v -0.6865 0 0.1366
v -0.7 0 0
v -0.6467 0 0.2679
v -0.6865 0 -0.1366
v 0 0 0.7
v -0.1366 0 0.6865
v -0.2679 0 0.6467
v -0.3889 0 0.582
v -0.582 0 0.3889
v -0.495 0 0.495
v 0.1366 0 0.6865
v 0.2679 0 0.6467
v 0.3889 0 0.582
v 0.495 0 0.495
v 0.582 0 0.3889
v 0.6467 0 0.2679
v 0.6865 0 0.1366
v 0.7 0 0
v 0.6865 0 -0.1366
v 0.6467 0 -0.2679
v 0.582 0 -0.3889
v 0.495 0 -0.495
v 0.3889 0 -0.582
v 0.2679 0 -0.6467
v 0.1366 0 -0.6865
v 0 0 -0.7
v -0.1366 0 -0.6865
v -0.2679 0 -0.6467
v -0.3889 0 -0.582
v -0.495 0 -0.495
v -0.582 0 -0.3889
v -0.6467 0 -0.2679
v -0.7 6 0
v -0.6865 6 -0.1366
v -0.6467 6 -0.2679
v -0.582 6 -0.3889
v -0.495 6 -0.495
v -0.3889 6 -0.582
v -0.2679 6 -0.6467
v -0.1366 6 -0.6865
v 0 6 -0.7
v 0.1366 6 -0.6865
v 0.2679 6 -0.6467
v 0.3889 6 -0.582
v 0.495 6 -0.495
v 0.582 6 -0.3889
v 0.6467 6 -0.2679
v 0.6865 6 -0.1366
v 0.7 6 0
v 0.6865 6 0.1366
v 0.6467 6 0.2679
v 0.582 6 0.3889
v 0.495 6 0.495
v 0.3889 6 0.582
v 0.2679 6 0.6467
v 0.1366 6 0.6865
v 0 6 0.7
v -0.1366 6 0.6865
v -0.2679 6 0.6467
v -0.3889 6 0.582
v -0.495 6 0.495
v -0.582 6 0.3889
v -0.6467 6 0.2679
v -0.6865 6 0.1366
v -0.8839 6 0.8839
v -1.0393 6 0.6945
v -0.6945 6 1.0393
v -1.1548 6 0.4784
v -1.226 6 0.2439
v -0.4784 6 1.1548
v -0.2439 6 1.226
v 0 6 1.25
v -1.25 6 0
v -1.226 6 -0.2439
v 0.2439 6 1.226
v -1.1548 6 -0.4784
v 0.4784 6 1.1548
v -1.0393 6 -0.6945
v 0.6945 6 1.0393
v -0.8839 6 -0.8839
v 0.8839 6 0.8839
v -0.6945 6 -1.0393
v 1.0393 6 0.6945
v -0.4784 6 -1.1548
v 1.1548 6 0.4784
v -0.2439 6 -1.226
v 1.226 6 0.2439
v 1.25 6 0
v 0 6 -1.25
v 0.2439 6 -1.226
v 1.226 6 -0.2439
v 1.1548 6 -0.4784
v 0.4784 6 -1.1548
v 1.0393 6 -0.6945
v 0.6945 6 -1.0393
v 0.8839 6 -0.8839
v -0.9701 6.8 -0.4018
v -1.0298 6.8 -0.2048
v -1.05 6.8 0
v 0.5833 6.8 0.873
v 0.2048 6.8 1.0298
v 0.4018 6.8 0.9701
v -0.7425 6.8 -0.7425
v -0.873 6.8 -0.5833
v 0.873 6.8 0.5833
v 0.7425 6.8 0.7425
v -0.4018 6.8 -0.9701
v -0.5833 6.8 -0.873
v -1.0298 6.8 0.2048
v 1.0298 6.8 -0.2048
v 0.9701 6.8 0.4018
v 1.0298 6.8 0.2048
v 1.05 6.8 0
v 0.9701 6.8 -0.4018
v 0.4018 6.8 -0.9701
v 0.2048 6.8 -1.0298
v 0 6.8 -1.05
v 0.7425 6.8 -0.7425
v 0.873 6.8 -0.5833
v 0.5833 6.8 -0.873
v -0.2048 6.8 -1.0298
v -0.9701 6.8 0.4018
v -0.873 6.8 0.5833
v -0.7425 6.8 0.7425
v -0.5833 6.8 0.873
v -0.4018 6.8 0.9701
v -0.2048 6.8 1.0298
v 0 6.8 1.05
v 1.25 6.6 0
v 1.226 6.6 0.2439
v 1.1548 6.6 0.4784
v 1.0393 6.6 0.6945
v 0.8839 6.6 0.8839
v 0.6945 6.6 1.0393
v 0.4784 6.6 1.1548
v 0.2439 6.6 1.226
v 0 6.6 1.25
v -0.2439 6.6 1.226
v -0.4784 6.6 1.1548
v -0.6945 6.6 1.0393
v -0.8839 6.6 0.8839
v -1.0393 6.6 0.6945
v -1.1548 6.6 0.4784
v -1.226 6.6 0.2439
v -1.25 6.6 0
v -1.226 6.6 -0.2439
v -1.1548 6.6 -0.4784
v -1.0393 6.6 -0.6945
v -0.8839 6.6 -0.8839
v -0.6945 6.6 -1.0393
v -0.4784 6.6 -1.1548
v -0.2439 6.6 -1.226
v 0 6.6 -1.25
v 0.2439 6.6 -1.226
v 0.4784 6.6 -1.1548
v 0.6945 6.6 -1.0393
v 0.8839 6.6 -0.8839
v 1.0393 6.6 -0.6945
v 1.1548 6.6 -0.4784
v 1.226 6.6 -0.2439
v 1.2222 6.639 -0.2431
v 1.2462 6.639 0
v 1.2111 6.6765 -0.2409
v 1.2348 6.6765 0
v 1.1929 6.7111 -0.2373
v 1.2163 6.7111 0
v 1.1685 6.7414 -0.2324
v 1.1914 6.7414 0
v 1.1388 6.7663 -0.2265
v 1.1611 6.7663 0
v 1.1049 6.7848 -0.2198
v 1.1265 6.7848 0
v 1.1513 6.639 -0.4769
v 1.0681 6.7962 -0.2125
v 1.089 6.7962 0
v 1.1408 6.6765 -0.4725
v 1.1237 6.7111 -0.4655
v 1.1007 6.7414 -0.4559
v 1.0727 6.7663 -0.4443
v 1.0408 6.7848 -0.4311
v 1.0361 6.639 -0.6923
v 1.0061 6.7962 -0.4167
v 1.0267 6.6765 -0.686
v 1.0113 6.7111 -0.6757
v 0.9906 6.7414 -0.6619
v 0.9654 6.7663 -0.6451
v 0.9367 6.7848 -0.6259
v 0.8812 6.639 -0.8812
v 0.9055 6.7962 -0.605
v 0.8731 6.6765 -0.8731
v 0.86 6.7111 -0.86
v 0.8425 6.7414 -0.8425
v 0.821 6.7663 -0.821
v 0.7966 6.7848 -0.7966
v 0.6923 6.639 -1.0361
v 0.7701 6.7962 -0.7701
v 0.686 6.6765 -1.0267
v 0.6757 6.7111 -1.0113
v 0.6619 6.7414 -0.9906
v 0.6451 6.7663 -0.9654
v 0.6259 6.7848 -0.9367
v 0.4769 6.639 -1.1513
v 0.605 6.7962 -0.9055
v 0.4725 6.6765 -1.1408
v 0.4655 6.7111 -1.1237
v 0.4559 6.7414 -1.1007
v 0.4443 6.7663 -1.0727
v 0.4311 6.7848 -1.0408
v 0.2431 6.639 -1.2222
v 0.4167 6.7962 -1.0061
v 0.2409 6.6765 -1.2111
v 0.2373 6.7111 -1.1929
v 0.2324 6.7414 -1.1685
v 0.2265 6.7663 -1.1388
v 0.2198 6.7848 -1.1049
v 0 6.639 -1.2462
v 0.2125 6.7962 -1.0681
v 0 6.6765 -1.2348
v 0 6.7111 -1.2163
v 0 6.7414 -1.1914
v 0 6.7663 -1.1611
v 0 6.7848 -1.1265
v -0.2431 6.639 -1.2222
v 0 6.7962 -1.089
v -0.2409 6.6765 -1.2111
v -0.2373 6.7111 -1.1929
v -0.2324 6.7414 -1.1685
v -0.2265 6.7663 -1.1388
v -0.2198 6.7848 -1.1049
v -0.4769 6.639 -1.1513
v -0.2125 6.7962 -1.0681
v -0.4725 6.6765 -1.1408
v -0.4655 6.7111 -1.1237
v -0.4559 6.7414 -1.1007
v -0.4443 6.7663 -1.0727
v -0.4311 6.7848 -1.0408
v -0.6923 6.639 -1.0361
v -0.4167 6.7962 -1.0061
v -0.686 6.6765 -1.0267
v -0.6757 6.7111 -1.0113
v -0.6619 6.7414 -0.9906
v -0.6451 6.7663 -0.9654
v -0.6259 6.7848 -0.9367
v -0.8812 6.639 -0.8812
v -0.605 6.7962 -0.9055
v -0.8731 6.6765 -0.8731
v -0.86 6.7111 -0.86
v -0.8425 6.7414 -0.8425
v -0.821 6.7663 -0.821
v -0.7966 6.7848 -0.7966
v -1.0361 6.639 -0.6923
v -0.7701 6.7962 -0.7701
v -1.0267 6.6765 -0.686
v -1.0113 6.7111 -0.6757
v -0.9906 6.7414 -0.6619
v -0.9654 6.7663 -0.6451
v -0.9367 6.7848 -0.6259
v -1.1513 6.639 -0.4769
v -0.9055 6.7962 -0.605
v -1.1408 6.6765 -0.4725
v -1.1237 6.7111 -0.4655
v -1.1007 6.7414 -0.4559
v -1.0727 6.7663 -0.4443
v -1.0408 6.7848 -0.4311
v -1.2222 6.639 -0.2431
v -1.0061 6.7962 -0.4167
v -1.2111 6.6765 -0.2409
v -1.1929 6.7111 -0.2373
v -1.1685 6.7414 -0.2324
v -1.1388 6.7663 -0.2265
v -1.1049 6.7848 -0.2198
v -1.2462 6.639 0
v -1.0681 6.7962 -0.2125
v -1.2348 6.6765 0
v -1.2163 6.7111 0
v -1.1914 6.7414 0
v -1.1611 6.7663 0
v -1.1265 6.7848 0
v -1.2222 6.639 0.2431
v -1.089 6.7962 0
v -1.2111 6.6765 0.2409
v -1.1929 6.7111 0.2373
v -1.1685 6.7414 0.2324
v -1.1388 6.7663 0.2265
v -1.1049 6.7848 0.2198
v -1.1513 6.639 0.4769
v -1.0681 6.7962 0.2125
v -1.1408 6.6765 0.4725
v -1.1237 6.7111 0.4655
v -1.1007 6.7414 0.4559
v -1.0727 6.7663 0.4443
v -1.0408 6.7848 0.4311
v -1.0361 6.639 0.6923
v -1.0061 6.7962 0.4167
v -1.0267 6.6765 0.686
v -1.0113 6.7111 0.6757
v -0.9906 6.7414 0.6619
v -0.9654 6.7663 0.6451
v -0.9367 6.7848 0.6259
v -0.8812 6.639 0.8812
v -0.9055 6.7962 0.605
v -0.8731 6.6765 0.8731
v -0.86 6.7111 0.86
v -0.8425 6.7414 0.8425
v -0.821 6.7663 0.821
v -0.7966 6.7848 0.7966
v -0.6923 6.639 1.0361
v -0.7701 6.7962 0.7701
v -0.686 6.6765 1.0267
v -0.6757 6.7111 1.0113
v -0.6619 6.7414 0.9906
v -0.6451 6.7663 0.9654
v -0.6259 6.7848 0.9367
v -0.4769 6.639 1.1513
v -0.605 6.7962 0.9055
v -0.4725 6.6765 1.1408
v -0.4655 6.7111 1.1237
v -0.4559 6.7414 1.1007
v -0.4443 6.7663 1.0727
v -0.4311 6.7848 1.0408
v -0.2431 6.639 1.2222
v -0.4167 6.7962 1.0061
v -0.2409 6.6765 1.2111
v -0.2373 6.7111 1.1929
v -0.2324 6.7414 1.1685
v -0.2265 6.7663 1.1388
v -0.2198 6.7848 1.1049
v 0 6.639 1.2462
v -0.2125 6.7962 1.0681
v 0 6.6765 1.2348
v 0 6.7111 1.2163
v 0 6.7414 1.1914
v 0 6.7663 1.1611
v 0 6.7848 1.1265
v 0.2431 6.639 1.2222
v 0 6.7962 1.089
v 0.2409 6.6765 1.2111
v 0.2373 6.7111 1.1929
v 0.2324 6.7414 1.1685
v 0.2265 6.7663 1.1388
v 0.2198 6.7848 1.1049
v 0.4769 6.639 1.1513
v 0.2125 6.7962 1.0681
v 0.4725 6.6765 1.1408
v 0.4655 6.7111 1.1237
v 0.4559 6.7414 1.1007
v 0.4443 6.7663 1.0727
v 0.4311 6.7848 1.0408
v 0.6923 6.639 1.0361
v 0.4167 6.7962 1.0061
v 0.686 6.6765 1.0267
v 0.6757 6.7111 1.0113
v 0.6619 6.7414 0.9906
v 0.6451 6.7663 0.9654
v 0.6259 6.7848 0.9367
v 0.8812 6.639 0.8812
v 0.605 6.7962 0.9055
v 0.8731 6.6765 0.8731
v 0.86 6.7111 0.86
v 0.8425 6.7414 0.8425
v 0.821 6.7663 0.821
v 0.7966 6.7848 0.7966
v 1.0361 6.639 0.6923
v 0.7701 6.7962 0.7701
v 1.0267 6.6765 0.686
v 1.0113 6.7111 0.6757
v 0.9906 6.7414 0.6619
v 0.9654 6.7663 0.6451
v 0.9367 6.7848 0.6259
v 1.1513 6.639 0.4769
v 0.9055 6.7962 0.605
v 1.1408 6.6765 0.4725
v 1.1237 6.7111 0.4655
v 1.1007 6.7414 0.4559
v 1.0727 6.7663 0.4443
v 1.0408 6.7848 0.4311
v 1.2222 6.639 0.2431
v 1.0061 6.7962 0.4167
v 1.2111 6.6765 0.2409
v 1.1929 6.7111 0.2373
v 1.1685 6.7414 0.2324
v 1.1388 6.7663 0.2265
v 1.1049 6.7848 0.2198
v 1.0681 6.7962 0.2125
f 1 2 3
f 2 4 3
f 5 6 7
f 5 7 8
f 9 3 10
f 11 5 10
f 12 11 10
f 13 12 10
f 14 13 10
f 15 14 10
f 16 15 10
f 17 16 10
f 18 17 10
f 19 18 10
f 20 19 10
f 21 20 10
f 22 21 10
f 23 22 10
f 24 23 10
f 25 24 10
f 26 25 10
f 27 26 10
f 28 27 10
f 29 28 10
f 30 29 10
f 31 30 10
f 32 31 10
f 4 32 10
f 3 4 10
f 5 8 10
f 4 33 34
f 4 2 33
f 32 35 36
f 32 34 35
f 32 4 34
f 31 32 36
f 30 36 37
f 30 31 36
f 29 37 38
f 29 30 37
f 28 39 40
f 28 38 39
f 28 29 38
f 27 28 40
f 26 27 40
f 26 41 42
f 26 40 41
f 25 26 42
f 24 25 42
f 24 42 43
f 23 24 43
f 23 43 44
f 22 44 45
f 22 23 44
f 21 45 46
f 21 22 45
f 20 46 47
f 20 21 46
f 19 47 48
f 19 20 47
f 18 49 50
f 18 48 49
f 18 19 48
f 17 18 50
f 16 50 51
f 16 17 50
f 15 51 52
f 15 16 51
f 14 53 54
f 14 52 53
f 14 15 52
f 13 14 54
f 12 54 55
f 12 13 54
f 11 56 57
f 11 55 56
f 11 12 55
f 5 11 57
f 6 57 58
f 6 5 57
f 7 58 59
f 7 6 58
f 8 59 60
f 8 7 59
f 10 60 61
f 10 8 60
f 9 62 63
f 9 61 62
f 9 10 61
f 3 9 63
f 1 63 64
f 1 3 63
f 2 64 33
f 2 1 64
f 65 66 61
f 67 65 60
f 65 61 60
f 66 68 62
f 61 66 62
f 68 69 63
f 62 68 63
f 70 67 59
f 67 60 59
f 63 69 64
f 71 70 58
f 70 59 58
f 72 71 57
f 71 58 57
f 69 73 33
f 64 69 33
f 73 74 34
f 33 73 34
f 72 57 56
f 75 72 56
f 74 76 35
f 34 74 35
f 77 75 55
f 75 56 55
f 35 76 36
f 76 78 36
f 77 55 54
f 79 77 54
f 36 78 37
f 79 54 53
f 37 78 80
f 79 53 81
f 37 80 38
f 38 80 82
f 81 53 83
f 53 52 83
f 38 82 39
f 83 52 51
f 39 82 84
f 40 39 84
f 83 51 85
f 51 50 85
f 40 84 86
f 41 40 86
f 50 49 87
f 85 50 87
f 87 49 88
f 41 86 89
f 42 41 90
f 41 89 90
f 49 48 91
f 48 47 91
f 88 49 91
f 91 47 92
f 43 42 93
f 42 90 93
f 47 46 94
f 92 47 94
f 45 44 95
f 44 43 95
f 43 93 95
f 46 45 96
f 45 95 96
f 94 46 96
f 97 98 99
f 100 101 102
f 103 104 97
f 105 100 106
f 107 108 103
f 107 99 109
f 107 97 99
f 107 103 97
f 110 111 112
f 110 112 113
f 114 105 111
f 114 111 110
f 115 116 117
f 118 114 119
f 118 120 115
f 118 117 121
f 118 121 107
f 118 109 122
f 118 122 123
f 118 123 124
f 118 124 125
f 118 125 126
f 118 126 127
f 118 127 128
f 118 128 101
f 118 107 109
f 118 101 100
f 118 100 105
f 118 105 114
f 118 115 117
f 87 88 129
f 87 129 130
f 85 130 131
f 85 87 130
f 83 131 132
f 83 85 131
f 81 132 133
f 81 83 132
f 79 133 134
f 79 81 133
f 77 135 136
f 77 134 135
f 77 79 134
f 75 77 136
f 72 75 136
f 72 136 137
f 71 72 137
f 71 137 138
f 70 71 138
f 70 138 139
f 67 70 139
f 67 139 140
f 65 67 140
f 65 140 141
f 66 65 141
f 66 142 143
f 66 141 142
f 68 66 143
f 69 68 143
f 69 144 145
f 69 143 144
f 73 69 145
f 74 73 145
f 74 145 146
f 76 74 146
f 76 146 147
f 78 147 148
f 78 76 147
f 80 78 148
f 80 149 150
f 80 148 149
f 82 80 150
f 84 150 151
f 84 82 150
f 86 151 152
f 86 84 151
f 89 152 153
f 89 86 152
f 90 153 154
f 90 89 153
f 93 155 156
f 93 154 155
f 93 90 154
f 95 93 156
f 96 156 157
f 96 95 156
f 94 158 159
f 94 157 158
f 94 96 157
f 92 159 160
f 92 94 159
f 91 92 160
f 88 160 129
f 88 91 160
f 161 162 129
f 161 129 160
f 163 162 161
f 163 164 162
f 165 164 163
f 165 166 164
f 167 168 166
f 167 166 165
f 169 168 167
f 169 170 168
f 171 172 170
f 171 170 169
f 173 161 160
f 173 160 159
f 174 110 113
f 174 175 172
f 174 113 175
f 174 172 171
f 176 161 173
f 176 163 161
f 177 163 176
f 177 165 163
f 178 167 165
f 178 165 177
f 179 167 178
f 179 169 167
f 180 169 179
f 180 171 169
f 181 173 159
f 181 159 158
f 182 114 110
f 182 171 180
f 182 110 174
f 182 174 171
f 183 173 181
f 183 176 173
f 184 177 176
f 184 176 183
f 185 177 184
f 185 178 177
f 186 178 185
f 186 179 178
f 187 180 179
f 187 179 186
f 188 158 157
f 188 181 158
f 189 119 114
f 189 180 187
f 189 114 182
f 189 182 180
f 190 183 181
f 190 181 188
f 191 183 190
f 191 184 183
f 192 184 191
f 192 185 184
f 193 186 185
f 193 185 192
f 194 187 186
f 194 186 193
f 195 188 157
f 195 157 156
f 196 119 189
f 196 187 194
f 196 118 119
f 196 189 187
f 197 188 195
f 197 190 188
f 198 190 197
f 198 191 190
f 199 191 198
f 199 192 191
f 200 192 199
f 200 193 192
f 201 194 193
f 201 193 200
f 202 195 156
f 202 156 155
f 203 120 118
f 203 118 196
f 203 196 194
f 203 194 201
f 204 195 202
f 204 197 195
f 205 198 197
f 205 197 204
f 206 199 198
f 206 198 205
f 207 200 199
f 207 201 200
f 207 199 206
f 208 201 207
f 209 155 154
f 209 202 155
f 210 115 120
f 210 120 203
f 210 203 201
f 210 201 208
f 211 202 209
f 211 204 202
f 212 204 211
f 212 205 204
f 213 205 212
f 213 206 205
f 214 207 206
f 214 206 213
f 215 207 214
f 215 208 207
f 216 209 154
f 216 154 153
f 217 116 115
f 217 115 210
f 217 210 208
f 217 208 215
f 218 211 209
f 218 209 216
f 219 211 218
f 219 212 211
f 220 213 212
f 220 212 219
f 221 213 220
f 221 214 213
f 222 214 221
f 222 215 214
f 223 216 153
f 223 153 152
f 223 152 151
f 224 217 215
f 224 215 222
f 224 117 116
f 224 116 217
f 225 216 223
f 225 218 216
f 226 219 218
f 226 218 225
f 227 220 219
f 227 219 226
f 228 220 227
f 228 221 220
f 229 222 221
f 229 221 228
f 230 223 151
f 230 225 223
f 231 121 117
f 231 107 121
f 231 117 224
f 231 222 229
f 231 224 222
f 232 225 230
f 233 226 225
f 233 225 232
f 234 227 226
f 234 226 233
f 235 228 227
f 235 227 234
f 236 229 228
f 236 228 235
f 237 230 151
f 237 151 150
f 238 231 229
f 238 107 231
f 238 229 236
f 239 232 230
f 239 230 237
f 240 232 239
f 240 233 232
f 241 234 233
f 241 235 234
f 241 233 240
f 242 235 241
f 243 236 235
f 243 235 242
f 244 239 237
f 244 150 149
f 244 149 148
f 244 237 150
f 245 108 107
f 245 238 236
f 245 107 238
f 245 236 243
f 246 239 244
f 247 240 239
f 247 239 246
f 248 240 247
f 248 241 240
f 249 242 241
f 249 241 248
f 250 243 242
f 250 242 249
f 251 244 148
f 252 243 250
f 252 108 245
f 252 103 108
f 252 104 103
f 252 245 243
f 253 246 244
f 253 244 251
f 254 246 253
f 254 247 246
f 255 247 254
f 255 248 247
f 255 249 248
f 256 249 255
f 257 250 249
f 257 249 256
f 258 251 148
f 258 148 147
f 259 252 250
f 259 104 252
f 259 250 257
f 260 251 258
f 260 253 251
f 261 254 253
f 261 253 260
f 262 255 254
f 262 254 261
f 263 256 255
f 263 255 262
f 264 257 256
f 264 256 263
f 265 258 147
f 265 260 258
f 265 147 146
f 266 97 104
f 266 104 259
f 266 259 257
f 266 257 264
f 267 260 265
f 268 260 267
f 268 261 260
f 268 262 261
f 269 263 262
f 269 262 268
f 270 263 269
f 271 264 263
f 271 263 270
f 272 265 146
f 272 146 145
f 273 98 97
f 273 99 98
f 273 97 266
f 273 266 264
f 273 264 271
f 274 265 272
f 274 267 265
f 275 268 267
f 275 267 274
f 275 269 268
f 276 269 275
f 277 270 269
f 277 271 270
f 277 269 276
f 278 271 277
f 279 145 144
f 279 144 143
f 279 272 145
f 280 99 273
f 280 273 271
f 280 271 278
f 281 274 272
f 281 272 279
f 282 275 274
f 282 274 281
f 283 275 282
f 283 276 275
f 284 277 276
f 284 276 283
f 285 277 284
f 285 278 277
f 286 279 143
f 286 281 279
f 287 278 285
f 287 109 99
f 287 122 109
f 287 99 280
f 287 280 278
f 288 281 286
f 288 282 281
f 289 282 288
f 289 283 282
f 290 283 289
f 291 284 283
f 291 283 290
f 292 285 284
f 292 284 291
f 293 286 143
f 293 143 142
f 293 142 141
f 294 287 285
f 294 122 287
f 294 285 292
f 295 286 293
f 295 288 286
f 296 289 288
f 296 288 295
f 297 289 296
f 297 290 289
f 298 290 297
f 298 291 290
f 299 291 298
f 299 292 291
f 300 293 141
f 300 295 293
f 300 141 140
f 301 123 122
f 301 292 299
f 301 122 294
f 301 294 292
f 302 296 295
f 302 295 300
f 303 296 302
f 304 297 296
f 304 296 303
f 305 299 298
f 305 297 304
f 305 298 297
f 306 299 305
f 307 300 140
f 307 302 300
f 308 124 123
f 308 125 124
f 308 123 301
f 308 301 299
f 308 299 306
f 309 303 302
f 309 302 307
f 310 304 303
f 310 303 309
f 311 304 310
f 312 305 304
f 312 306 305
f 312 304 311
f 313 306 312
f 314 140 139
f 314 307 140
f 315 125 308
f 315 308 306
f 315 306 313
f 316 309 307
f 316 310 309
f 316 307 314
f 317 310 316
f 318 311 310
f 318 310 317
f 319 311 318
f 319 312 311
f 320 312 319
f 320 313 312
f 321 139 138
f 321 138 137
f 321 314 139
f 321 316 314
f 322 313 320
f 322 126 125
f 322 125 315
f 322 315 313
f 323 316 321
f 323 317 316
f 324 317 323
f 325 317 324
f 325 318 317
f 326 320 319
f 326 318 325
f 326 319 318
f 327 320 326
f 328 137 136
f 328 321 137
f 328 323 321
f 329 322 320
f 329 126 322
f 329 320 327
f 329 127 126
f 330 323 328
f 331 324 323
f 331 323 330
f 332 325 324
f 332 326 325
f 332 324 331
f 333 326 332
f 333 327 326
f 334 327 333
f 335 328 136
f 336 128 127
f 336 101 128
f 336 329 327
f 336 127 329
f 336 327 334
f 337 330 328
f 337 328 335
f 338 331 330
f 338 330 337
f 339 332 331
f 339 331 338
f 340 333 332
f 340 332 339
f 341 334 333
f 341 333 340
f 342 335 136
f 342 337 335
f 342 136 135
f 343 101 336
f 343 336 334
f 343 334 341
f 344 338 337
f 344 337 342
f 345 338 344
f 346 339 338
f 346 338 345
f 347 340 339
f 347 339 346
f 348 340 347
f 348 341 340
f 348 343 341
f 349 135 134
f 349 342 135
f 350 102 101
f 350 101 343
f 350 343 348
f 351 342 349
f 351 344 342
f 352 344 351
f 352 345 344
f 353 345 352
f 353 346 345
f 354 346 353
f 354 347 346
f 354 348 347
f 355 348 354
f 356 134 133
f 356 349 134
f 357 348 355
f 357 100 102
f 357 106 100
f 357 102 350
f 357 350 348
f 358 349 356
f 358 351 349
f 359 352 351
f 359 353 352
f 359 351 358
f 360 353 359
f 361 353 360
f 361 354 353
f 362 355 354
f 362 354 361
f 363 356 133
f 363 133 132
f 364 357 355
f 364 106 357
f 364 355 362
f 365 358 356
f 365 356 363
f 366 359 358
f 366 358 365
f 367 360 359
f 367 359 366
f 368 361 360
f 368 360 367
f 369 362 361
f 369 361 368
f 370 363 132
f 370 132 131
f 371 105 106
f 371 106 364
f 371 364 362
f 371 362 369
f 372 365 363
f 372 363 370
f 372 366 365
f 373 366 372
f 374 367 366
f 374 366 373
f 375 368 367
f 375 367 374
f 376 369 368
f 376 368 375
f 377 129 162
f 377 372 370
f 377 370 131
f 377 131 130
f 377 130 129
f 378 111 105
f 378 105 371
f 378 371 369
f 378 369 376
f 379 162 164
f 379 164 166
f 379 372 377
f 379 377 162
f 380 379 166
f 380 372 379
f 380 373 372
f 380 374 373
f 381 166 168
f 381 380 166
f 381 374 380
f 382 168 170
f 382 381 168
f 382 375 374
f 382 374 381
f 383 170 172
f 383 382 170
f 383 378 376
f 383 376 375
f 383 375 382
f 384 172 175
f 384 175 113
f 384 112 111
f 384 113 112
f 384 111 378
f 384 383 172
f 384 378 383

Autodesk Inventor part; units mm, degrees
ref_plane "YZ Plane" through (0, 0, 0) normal (1, 0, 0) x (0, 1, 0)
ref_plane "XZ Plane" through (0, 0, 0) normal (0, 1, 0) x (-1, 0, 0)
ref_plane "XY Plane" through (0, 0, 0) normal (0, 0, 1) x (1, 0, 0)
sketch "Sketch1" plane through (0, 0, 0) normal (0, 1, 0) x (-1, 0, 0)
  circle A0 centre (0, 0) radius 0.7
  dimension "d0" = 1.4
extrude "Extrusion1" add sketch "Sketch1" along normal blind 6
thread "Thread1" size "M1.4x0.3" class "6g" standard "ANSI Metric M Profile" length 8
sketch "Sketch2" plane through (0, 6, 0) normal (0, 1, 0) x (1, 0, 0)
  circle A0 centre (0, 0) radius 1.25
  dimension "d5" = 2.5
extrude "Extrusion2" add sketch "Sketch2" along normal blind 0.8
fillet "Fillet1" radius 0.2 1 edges at (-1.25, 6.8, 0)
properties part number "m1_4_6mm_screw"
